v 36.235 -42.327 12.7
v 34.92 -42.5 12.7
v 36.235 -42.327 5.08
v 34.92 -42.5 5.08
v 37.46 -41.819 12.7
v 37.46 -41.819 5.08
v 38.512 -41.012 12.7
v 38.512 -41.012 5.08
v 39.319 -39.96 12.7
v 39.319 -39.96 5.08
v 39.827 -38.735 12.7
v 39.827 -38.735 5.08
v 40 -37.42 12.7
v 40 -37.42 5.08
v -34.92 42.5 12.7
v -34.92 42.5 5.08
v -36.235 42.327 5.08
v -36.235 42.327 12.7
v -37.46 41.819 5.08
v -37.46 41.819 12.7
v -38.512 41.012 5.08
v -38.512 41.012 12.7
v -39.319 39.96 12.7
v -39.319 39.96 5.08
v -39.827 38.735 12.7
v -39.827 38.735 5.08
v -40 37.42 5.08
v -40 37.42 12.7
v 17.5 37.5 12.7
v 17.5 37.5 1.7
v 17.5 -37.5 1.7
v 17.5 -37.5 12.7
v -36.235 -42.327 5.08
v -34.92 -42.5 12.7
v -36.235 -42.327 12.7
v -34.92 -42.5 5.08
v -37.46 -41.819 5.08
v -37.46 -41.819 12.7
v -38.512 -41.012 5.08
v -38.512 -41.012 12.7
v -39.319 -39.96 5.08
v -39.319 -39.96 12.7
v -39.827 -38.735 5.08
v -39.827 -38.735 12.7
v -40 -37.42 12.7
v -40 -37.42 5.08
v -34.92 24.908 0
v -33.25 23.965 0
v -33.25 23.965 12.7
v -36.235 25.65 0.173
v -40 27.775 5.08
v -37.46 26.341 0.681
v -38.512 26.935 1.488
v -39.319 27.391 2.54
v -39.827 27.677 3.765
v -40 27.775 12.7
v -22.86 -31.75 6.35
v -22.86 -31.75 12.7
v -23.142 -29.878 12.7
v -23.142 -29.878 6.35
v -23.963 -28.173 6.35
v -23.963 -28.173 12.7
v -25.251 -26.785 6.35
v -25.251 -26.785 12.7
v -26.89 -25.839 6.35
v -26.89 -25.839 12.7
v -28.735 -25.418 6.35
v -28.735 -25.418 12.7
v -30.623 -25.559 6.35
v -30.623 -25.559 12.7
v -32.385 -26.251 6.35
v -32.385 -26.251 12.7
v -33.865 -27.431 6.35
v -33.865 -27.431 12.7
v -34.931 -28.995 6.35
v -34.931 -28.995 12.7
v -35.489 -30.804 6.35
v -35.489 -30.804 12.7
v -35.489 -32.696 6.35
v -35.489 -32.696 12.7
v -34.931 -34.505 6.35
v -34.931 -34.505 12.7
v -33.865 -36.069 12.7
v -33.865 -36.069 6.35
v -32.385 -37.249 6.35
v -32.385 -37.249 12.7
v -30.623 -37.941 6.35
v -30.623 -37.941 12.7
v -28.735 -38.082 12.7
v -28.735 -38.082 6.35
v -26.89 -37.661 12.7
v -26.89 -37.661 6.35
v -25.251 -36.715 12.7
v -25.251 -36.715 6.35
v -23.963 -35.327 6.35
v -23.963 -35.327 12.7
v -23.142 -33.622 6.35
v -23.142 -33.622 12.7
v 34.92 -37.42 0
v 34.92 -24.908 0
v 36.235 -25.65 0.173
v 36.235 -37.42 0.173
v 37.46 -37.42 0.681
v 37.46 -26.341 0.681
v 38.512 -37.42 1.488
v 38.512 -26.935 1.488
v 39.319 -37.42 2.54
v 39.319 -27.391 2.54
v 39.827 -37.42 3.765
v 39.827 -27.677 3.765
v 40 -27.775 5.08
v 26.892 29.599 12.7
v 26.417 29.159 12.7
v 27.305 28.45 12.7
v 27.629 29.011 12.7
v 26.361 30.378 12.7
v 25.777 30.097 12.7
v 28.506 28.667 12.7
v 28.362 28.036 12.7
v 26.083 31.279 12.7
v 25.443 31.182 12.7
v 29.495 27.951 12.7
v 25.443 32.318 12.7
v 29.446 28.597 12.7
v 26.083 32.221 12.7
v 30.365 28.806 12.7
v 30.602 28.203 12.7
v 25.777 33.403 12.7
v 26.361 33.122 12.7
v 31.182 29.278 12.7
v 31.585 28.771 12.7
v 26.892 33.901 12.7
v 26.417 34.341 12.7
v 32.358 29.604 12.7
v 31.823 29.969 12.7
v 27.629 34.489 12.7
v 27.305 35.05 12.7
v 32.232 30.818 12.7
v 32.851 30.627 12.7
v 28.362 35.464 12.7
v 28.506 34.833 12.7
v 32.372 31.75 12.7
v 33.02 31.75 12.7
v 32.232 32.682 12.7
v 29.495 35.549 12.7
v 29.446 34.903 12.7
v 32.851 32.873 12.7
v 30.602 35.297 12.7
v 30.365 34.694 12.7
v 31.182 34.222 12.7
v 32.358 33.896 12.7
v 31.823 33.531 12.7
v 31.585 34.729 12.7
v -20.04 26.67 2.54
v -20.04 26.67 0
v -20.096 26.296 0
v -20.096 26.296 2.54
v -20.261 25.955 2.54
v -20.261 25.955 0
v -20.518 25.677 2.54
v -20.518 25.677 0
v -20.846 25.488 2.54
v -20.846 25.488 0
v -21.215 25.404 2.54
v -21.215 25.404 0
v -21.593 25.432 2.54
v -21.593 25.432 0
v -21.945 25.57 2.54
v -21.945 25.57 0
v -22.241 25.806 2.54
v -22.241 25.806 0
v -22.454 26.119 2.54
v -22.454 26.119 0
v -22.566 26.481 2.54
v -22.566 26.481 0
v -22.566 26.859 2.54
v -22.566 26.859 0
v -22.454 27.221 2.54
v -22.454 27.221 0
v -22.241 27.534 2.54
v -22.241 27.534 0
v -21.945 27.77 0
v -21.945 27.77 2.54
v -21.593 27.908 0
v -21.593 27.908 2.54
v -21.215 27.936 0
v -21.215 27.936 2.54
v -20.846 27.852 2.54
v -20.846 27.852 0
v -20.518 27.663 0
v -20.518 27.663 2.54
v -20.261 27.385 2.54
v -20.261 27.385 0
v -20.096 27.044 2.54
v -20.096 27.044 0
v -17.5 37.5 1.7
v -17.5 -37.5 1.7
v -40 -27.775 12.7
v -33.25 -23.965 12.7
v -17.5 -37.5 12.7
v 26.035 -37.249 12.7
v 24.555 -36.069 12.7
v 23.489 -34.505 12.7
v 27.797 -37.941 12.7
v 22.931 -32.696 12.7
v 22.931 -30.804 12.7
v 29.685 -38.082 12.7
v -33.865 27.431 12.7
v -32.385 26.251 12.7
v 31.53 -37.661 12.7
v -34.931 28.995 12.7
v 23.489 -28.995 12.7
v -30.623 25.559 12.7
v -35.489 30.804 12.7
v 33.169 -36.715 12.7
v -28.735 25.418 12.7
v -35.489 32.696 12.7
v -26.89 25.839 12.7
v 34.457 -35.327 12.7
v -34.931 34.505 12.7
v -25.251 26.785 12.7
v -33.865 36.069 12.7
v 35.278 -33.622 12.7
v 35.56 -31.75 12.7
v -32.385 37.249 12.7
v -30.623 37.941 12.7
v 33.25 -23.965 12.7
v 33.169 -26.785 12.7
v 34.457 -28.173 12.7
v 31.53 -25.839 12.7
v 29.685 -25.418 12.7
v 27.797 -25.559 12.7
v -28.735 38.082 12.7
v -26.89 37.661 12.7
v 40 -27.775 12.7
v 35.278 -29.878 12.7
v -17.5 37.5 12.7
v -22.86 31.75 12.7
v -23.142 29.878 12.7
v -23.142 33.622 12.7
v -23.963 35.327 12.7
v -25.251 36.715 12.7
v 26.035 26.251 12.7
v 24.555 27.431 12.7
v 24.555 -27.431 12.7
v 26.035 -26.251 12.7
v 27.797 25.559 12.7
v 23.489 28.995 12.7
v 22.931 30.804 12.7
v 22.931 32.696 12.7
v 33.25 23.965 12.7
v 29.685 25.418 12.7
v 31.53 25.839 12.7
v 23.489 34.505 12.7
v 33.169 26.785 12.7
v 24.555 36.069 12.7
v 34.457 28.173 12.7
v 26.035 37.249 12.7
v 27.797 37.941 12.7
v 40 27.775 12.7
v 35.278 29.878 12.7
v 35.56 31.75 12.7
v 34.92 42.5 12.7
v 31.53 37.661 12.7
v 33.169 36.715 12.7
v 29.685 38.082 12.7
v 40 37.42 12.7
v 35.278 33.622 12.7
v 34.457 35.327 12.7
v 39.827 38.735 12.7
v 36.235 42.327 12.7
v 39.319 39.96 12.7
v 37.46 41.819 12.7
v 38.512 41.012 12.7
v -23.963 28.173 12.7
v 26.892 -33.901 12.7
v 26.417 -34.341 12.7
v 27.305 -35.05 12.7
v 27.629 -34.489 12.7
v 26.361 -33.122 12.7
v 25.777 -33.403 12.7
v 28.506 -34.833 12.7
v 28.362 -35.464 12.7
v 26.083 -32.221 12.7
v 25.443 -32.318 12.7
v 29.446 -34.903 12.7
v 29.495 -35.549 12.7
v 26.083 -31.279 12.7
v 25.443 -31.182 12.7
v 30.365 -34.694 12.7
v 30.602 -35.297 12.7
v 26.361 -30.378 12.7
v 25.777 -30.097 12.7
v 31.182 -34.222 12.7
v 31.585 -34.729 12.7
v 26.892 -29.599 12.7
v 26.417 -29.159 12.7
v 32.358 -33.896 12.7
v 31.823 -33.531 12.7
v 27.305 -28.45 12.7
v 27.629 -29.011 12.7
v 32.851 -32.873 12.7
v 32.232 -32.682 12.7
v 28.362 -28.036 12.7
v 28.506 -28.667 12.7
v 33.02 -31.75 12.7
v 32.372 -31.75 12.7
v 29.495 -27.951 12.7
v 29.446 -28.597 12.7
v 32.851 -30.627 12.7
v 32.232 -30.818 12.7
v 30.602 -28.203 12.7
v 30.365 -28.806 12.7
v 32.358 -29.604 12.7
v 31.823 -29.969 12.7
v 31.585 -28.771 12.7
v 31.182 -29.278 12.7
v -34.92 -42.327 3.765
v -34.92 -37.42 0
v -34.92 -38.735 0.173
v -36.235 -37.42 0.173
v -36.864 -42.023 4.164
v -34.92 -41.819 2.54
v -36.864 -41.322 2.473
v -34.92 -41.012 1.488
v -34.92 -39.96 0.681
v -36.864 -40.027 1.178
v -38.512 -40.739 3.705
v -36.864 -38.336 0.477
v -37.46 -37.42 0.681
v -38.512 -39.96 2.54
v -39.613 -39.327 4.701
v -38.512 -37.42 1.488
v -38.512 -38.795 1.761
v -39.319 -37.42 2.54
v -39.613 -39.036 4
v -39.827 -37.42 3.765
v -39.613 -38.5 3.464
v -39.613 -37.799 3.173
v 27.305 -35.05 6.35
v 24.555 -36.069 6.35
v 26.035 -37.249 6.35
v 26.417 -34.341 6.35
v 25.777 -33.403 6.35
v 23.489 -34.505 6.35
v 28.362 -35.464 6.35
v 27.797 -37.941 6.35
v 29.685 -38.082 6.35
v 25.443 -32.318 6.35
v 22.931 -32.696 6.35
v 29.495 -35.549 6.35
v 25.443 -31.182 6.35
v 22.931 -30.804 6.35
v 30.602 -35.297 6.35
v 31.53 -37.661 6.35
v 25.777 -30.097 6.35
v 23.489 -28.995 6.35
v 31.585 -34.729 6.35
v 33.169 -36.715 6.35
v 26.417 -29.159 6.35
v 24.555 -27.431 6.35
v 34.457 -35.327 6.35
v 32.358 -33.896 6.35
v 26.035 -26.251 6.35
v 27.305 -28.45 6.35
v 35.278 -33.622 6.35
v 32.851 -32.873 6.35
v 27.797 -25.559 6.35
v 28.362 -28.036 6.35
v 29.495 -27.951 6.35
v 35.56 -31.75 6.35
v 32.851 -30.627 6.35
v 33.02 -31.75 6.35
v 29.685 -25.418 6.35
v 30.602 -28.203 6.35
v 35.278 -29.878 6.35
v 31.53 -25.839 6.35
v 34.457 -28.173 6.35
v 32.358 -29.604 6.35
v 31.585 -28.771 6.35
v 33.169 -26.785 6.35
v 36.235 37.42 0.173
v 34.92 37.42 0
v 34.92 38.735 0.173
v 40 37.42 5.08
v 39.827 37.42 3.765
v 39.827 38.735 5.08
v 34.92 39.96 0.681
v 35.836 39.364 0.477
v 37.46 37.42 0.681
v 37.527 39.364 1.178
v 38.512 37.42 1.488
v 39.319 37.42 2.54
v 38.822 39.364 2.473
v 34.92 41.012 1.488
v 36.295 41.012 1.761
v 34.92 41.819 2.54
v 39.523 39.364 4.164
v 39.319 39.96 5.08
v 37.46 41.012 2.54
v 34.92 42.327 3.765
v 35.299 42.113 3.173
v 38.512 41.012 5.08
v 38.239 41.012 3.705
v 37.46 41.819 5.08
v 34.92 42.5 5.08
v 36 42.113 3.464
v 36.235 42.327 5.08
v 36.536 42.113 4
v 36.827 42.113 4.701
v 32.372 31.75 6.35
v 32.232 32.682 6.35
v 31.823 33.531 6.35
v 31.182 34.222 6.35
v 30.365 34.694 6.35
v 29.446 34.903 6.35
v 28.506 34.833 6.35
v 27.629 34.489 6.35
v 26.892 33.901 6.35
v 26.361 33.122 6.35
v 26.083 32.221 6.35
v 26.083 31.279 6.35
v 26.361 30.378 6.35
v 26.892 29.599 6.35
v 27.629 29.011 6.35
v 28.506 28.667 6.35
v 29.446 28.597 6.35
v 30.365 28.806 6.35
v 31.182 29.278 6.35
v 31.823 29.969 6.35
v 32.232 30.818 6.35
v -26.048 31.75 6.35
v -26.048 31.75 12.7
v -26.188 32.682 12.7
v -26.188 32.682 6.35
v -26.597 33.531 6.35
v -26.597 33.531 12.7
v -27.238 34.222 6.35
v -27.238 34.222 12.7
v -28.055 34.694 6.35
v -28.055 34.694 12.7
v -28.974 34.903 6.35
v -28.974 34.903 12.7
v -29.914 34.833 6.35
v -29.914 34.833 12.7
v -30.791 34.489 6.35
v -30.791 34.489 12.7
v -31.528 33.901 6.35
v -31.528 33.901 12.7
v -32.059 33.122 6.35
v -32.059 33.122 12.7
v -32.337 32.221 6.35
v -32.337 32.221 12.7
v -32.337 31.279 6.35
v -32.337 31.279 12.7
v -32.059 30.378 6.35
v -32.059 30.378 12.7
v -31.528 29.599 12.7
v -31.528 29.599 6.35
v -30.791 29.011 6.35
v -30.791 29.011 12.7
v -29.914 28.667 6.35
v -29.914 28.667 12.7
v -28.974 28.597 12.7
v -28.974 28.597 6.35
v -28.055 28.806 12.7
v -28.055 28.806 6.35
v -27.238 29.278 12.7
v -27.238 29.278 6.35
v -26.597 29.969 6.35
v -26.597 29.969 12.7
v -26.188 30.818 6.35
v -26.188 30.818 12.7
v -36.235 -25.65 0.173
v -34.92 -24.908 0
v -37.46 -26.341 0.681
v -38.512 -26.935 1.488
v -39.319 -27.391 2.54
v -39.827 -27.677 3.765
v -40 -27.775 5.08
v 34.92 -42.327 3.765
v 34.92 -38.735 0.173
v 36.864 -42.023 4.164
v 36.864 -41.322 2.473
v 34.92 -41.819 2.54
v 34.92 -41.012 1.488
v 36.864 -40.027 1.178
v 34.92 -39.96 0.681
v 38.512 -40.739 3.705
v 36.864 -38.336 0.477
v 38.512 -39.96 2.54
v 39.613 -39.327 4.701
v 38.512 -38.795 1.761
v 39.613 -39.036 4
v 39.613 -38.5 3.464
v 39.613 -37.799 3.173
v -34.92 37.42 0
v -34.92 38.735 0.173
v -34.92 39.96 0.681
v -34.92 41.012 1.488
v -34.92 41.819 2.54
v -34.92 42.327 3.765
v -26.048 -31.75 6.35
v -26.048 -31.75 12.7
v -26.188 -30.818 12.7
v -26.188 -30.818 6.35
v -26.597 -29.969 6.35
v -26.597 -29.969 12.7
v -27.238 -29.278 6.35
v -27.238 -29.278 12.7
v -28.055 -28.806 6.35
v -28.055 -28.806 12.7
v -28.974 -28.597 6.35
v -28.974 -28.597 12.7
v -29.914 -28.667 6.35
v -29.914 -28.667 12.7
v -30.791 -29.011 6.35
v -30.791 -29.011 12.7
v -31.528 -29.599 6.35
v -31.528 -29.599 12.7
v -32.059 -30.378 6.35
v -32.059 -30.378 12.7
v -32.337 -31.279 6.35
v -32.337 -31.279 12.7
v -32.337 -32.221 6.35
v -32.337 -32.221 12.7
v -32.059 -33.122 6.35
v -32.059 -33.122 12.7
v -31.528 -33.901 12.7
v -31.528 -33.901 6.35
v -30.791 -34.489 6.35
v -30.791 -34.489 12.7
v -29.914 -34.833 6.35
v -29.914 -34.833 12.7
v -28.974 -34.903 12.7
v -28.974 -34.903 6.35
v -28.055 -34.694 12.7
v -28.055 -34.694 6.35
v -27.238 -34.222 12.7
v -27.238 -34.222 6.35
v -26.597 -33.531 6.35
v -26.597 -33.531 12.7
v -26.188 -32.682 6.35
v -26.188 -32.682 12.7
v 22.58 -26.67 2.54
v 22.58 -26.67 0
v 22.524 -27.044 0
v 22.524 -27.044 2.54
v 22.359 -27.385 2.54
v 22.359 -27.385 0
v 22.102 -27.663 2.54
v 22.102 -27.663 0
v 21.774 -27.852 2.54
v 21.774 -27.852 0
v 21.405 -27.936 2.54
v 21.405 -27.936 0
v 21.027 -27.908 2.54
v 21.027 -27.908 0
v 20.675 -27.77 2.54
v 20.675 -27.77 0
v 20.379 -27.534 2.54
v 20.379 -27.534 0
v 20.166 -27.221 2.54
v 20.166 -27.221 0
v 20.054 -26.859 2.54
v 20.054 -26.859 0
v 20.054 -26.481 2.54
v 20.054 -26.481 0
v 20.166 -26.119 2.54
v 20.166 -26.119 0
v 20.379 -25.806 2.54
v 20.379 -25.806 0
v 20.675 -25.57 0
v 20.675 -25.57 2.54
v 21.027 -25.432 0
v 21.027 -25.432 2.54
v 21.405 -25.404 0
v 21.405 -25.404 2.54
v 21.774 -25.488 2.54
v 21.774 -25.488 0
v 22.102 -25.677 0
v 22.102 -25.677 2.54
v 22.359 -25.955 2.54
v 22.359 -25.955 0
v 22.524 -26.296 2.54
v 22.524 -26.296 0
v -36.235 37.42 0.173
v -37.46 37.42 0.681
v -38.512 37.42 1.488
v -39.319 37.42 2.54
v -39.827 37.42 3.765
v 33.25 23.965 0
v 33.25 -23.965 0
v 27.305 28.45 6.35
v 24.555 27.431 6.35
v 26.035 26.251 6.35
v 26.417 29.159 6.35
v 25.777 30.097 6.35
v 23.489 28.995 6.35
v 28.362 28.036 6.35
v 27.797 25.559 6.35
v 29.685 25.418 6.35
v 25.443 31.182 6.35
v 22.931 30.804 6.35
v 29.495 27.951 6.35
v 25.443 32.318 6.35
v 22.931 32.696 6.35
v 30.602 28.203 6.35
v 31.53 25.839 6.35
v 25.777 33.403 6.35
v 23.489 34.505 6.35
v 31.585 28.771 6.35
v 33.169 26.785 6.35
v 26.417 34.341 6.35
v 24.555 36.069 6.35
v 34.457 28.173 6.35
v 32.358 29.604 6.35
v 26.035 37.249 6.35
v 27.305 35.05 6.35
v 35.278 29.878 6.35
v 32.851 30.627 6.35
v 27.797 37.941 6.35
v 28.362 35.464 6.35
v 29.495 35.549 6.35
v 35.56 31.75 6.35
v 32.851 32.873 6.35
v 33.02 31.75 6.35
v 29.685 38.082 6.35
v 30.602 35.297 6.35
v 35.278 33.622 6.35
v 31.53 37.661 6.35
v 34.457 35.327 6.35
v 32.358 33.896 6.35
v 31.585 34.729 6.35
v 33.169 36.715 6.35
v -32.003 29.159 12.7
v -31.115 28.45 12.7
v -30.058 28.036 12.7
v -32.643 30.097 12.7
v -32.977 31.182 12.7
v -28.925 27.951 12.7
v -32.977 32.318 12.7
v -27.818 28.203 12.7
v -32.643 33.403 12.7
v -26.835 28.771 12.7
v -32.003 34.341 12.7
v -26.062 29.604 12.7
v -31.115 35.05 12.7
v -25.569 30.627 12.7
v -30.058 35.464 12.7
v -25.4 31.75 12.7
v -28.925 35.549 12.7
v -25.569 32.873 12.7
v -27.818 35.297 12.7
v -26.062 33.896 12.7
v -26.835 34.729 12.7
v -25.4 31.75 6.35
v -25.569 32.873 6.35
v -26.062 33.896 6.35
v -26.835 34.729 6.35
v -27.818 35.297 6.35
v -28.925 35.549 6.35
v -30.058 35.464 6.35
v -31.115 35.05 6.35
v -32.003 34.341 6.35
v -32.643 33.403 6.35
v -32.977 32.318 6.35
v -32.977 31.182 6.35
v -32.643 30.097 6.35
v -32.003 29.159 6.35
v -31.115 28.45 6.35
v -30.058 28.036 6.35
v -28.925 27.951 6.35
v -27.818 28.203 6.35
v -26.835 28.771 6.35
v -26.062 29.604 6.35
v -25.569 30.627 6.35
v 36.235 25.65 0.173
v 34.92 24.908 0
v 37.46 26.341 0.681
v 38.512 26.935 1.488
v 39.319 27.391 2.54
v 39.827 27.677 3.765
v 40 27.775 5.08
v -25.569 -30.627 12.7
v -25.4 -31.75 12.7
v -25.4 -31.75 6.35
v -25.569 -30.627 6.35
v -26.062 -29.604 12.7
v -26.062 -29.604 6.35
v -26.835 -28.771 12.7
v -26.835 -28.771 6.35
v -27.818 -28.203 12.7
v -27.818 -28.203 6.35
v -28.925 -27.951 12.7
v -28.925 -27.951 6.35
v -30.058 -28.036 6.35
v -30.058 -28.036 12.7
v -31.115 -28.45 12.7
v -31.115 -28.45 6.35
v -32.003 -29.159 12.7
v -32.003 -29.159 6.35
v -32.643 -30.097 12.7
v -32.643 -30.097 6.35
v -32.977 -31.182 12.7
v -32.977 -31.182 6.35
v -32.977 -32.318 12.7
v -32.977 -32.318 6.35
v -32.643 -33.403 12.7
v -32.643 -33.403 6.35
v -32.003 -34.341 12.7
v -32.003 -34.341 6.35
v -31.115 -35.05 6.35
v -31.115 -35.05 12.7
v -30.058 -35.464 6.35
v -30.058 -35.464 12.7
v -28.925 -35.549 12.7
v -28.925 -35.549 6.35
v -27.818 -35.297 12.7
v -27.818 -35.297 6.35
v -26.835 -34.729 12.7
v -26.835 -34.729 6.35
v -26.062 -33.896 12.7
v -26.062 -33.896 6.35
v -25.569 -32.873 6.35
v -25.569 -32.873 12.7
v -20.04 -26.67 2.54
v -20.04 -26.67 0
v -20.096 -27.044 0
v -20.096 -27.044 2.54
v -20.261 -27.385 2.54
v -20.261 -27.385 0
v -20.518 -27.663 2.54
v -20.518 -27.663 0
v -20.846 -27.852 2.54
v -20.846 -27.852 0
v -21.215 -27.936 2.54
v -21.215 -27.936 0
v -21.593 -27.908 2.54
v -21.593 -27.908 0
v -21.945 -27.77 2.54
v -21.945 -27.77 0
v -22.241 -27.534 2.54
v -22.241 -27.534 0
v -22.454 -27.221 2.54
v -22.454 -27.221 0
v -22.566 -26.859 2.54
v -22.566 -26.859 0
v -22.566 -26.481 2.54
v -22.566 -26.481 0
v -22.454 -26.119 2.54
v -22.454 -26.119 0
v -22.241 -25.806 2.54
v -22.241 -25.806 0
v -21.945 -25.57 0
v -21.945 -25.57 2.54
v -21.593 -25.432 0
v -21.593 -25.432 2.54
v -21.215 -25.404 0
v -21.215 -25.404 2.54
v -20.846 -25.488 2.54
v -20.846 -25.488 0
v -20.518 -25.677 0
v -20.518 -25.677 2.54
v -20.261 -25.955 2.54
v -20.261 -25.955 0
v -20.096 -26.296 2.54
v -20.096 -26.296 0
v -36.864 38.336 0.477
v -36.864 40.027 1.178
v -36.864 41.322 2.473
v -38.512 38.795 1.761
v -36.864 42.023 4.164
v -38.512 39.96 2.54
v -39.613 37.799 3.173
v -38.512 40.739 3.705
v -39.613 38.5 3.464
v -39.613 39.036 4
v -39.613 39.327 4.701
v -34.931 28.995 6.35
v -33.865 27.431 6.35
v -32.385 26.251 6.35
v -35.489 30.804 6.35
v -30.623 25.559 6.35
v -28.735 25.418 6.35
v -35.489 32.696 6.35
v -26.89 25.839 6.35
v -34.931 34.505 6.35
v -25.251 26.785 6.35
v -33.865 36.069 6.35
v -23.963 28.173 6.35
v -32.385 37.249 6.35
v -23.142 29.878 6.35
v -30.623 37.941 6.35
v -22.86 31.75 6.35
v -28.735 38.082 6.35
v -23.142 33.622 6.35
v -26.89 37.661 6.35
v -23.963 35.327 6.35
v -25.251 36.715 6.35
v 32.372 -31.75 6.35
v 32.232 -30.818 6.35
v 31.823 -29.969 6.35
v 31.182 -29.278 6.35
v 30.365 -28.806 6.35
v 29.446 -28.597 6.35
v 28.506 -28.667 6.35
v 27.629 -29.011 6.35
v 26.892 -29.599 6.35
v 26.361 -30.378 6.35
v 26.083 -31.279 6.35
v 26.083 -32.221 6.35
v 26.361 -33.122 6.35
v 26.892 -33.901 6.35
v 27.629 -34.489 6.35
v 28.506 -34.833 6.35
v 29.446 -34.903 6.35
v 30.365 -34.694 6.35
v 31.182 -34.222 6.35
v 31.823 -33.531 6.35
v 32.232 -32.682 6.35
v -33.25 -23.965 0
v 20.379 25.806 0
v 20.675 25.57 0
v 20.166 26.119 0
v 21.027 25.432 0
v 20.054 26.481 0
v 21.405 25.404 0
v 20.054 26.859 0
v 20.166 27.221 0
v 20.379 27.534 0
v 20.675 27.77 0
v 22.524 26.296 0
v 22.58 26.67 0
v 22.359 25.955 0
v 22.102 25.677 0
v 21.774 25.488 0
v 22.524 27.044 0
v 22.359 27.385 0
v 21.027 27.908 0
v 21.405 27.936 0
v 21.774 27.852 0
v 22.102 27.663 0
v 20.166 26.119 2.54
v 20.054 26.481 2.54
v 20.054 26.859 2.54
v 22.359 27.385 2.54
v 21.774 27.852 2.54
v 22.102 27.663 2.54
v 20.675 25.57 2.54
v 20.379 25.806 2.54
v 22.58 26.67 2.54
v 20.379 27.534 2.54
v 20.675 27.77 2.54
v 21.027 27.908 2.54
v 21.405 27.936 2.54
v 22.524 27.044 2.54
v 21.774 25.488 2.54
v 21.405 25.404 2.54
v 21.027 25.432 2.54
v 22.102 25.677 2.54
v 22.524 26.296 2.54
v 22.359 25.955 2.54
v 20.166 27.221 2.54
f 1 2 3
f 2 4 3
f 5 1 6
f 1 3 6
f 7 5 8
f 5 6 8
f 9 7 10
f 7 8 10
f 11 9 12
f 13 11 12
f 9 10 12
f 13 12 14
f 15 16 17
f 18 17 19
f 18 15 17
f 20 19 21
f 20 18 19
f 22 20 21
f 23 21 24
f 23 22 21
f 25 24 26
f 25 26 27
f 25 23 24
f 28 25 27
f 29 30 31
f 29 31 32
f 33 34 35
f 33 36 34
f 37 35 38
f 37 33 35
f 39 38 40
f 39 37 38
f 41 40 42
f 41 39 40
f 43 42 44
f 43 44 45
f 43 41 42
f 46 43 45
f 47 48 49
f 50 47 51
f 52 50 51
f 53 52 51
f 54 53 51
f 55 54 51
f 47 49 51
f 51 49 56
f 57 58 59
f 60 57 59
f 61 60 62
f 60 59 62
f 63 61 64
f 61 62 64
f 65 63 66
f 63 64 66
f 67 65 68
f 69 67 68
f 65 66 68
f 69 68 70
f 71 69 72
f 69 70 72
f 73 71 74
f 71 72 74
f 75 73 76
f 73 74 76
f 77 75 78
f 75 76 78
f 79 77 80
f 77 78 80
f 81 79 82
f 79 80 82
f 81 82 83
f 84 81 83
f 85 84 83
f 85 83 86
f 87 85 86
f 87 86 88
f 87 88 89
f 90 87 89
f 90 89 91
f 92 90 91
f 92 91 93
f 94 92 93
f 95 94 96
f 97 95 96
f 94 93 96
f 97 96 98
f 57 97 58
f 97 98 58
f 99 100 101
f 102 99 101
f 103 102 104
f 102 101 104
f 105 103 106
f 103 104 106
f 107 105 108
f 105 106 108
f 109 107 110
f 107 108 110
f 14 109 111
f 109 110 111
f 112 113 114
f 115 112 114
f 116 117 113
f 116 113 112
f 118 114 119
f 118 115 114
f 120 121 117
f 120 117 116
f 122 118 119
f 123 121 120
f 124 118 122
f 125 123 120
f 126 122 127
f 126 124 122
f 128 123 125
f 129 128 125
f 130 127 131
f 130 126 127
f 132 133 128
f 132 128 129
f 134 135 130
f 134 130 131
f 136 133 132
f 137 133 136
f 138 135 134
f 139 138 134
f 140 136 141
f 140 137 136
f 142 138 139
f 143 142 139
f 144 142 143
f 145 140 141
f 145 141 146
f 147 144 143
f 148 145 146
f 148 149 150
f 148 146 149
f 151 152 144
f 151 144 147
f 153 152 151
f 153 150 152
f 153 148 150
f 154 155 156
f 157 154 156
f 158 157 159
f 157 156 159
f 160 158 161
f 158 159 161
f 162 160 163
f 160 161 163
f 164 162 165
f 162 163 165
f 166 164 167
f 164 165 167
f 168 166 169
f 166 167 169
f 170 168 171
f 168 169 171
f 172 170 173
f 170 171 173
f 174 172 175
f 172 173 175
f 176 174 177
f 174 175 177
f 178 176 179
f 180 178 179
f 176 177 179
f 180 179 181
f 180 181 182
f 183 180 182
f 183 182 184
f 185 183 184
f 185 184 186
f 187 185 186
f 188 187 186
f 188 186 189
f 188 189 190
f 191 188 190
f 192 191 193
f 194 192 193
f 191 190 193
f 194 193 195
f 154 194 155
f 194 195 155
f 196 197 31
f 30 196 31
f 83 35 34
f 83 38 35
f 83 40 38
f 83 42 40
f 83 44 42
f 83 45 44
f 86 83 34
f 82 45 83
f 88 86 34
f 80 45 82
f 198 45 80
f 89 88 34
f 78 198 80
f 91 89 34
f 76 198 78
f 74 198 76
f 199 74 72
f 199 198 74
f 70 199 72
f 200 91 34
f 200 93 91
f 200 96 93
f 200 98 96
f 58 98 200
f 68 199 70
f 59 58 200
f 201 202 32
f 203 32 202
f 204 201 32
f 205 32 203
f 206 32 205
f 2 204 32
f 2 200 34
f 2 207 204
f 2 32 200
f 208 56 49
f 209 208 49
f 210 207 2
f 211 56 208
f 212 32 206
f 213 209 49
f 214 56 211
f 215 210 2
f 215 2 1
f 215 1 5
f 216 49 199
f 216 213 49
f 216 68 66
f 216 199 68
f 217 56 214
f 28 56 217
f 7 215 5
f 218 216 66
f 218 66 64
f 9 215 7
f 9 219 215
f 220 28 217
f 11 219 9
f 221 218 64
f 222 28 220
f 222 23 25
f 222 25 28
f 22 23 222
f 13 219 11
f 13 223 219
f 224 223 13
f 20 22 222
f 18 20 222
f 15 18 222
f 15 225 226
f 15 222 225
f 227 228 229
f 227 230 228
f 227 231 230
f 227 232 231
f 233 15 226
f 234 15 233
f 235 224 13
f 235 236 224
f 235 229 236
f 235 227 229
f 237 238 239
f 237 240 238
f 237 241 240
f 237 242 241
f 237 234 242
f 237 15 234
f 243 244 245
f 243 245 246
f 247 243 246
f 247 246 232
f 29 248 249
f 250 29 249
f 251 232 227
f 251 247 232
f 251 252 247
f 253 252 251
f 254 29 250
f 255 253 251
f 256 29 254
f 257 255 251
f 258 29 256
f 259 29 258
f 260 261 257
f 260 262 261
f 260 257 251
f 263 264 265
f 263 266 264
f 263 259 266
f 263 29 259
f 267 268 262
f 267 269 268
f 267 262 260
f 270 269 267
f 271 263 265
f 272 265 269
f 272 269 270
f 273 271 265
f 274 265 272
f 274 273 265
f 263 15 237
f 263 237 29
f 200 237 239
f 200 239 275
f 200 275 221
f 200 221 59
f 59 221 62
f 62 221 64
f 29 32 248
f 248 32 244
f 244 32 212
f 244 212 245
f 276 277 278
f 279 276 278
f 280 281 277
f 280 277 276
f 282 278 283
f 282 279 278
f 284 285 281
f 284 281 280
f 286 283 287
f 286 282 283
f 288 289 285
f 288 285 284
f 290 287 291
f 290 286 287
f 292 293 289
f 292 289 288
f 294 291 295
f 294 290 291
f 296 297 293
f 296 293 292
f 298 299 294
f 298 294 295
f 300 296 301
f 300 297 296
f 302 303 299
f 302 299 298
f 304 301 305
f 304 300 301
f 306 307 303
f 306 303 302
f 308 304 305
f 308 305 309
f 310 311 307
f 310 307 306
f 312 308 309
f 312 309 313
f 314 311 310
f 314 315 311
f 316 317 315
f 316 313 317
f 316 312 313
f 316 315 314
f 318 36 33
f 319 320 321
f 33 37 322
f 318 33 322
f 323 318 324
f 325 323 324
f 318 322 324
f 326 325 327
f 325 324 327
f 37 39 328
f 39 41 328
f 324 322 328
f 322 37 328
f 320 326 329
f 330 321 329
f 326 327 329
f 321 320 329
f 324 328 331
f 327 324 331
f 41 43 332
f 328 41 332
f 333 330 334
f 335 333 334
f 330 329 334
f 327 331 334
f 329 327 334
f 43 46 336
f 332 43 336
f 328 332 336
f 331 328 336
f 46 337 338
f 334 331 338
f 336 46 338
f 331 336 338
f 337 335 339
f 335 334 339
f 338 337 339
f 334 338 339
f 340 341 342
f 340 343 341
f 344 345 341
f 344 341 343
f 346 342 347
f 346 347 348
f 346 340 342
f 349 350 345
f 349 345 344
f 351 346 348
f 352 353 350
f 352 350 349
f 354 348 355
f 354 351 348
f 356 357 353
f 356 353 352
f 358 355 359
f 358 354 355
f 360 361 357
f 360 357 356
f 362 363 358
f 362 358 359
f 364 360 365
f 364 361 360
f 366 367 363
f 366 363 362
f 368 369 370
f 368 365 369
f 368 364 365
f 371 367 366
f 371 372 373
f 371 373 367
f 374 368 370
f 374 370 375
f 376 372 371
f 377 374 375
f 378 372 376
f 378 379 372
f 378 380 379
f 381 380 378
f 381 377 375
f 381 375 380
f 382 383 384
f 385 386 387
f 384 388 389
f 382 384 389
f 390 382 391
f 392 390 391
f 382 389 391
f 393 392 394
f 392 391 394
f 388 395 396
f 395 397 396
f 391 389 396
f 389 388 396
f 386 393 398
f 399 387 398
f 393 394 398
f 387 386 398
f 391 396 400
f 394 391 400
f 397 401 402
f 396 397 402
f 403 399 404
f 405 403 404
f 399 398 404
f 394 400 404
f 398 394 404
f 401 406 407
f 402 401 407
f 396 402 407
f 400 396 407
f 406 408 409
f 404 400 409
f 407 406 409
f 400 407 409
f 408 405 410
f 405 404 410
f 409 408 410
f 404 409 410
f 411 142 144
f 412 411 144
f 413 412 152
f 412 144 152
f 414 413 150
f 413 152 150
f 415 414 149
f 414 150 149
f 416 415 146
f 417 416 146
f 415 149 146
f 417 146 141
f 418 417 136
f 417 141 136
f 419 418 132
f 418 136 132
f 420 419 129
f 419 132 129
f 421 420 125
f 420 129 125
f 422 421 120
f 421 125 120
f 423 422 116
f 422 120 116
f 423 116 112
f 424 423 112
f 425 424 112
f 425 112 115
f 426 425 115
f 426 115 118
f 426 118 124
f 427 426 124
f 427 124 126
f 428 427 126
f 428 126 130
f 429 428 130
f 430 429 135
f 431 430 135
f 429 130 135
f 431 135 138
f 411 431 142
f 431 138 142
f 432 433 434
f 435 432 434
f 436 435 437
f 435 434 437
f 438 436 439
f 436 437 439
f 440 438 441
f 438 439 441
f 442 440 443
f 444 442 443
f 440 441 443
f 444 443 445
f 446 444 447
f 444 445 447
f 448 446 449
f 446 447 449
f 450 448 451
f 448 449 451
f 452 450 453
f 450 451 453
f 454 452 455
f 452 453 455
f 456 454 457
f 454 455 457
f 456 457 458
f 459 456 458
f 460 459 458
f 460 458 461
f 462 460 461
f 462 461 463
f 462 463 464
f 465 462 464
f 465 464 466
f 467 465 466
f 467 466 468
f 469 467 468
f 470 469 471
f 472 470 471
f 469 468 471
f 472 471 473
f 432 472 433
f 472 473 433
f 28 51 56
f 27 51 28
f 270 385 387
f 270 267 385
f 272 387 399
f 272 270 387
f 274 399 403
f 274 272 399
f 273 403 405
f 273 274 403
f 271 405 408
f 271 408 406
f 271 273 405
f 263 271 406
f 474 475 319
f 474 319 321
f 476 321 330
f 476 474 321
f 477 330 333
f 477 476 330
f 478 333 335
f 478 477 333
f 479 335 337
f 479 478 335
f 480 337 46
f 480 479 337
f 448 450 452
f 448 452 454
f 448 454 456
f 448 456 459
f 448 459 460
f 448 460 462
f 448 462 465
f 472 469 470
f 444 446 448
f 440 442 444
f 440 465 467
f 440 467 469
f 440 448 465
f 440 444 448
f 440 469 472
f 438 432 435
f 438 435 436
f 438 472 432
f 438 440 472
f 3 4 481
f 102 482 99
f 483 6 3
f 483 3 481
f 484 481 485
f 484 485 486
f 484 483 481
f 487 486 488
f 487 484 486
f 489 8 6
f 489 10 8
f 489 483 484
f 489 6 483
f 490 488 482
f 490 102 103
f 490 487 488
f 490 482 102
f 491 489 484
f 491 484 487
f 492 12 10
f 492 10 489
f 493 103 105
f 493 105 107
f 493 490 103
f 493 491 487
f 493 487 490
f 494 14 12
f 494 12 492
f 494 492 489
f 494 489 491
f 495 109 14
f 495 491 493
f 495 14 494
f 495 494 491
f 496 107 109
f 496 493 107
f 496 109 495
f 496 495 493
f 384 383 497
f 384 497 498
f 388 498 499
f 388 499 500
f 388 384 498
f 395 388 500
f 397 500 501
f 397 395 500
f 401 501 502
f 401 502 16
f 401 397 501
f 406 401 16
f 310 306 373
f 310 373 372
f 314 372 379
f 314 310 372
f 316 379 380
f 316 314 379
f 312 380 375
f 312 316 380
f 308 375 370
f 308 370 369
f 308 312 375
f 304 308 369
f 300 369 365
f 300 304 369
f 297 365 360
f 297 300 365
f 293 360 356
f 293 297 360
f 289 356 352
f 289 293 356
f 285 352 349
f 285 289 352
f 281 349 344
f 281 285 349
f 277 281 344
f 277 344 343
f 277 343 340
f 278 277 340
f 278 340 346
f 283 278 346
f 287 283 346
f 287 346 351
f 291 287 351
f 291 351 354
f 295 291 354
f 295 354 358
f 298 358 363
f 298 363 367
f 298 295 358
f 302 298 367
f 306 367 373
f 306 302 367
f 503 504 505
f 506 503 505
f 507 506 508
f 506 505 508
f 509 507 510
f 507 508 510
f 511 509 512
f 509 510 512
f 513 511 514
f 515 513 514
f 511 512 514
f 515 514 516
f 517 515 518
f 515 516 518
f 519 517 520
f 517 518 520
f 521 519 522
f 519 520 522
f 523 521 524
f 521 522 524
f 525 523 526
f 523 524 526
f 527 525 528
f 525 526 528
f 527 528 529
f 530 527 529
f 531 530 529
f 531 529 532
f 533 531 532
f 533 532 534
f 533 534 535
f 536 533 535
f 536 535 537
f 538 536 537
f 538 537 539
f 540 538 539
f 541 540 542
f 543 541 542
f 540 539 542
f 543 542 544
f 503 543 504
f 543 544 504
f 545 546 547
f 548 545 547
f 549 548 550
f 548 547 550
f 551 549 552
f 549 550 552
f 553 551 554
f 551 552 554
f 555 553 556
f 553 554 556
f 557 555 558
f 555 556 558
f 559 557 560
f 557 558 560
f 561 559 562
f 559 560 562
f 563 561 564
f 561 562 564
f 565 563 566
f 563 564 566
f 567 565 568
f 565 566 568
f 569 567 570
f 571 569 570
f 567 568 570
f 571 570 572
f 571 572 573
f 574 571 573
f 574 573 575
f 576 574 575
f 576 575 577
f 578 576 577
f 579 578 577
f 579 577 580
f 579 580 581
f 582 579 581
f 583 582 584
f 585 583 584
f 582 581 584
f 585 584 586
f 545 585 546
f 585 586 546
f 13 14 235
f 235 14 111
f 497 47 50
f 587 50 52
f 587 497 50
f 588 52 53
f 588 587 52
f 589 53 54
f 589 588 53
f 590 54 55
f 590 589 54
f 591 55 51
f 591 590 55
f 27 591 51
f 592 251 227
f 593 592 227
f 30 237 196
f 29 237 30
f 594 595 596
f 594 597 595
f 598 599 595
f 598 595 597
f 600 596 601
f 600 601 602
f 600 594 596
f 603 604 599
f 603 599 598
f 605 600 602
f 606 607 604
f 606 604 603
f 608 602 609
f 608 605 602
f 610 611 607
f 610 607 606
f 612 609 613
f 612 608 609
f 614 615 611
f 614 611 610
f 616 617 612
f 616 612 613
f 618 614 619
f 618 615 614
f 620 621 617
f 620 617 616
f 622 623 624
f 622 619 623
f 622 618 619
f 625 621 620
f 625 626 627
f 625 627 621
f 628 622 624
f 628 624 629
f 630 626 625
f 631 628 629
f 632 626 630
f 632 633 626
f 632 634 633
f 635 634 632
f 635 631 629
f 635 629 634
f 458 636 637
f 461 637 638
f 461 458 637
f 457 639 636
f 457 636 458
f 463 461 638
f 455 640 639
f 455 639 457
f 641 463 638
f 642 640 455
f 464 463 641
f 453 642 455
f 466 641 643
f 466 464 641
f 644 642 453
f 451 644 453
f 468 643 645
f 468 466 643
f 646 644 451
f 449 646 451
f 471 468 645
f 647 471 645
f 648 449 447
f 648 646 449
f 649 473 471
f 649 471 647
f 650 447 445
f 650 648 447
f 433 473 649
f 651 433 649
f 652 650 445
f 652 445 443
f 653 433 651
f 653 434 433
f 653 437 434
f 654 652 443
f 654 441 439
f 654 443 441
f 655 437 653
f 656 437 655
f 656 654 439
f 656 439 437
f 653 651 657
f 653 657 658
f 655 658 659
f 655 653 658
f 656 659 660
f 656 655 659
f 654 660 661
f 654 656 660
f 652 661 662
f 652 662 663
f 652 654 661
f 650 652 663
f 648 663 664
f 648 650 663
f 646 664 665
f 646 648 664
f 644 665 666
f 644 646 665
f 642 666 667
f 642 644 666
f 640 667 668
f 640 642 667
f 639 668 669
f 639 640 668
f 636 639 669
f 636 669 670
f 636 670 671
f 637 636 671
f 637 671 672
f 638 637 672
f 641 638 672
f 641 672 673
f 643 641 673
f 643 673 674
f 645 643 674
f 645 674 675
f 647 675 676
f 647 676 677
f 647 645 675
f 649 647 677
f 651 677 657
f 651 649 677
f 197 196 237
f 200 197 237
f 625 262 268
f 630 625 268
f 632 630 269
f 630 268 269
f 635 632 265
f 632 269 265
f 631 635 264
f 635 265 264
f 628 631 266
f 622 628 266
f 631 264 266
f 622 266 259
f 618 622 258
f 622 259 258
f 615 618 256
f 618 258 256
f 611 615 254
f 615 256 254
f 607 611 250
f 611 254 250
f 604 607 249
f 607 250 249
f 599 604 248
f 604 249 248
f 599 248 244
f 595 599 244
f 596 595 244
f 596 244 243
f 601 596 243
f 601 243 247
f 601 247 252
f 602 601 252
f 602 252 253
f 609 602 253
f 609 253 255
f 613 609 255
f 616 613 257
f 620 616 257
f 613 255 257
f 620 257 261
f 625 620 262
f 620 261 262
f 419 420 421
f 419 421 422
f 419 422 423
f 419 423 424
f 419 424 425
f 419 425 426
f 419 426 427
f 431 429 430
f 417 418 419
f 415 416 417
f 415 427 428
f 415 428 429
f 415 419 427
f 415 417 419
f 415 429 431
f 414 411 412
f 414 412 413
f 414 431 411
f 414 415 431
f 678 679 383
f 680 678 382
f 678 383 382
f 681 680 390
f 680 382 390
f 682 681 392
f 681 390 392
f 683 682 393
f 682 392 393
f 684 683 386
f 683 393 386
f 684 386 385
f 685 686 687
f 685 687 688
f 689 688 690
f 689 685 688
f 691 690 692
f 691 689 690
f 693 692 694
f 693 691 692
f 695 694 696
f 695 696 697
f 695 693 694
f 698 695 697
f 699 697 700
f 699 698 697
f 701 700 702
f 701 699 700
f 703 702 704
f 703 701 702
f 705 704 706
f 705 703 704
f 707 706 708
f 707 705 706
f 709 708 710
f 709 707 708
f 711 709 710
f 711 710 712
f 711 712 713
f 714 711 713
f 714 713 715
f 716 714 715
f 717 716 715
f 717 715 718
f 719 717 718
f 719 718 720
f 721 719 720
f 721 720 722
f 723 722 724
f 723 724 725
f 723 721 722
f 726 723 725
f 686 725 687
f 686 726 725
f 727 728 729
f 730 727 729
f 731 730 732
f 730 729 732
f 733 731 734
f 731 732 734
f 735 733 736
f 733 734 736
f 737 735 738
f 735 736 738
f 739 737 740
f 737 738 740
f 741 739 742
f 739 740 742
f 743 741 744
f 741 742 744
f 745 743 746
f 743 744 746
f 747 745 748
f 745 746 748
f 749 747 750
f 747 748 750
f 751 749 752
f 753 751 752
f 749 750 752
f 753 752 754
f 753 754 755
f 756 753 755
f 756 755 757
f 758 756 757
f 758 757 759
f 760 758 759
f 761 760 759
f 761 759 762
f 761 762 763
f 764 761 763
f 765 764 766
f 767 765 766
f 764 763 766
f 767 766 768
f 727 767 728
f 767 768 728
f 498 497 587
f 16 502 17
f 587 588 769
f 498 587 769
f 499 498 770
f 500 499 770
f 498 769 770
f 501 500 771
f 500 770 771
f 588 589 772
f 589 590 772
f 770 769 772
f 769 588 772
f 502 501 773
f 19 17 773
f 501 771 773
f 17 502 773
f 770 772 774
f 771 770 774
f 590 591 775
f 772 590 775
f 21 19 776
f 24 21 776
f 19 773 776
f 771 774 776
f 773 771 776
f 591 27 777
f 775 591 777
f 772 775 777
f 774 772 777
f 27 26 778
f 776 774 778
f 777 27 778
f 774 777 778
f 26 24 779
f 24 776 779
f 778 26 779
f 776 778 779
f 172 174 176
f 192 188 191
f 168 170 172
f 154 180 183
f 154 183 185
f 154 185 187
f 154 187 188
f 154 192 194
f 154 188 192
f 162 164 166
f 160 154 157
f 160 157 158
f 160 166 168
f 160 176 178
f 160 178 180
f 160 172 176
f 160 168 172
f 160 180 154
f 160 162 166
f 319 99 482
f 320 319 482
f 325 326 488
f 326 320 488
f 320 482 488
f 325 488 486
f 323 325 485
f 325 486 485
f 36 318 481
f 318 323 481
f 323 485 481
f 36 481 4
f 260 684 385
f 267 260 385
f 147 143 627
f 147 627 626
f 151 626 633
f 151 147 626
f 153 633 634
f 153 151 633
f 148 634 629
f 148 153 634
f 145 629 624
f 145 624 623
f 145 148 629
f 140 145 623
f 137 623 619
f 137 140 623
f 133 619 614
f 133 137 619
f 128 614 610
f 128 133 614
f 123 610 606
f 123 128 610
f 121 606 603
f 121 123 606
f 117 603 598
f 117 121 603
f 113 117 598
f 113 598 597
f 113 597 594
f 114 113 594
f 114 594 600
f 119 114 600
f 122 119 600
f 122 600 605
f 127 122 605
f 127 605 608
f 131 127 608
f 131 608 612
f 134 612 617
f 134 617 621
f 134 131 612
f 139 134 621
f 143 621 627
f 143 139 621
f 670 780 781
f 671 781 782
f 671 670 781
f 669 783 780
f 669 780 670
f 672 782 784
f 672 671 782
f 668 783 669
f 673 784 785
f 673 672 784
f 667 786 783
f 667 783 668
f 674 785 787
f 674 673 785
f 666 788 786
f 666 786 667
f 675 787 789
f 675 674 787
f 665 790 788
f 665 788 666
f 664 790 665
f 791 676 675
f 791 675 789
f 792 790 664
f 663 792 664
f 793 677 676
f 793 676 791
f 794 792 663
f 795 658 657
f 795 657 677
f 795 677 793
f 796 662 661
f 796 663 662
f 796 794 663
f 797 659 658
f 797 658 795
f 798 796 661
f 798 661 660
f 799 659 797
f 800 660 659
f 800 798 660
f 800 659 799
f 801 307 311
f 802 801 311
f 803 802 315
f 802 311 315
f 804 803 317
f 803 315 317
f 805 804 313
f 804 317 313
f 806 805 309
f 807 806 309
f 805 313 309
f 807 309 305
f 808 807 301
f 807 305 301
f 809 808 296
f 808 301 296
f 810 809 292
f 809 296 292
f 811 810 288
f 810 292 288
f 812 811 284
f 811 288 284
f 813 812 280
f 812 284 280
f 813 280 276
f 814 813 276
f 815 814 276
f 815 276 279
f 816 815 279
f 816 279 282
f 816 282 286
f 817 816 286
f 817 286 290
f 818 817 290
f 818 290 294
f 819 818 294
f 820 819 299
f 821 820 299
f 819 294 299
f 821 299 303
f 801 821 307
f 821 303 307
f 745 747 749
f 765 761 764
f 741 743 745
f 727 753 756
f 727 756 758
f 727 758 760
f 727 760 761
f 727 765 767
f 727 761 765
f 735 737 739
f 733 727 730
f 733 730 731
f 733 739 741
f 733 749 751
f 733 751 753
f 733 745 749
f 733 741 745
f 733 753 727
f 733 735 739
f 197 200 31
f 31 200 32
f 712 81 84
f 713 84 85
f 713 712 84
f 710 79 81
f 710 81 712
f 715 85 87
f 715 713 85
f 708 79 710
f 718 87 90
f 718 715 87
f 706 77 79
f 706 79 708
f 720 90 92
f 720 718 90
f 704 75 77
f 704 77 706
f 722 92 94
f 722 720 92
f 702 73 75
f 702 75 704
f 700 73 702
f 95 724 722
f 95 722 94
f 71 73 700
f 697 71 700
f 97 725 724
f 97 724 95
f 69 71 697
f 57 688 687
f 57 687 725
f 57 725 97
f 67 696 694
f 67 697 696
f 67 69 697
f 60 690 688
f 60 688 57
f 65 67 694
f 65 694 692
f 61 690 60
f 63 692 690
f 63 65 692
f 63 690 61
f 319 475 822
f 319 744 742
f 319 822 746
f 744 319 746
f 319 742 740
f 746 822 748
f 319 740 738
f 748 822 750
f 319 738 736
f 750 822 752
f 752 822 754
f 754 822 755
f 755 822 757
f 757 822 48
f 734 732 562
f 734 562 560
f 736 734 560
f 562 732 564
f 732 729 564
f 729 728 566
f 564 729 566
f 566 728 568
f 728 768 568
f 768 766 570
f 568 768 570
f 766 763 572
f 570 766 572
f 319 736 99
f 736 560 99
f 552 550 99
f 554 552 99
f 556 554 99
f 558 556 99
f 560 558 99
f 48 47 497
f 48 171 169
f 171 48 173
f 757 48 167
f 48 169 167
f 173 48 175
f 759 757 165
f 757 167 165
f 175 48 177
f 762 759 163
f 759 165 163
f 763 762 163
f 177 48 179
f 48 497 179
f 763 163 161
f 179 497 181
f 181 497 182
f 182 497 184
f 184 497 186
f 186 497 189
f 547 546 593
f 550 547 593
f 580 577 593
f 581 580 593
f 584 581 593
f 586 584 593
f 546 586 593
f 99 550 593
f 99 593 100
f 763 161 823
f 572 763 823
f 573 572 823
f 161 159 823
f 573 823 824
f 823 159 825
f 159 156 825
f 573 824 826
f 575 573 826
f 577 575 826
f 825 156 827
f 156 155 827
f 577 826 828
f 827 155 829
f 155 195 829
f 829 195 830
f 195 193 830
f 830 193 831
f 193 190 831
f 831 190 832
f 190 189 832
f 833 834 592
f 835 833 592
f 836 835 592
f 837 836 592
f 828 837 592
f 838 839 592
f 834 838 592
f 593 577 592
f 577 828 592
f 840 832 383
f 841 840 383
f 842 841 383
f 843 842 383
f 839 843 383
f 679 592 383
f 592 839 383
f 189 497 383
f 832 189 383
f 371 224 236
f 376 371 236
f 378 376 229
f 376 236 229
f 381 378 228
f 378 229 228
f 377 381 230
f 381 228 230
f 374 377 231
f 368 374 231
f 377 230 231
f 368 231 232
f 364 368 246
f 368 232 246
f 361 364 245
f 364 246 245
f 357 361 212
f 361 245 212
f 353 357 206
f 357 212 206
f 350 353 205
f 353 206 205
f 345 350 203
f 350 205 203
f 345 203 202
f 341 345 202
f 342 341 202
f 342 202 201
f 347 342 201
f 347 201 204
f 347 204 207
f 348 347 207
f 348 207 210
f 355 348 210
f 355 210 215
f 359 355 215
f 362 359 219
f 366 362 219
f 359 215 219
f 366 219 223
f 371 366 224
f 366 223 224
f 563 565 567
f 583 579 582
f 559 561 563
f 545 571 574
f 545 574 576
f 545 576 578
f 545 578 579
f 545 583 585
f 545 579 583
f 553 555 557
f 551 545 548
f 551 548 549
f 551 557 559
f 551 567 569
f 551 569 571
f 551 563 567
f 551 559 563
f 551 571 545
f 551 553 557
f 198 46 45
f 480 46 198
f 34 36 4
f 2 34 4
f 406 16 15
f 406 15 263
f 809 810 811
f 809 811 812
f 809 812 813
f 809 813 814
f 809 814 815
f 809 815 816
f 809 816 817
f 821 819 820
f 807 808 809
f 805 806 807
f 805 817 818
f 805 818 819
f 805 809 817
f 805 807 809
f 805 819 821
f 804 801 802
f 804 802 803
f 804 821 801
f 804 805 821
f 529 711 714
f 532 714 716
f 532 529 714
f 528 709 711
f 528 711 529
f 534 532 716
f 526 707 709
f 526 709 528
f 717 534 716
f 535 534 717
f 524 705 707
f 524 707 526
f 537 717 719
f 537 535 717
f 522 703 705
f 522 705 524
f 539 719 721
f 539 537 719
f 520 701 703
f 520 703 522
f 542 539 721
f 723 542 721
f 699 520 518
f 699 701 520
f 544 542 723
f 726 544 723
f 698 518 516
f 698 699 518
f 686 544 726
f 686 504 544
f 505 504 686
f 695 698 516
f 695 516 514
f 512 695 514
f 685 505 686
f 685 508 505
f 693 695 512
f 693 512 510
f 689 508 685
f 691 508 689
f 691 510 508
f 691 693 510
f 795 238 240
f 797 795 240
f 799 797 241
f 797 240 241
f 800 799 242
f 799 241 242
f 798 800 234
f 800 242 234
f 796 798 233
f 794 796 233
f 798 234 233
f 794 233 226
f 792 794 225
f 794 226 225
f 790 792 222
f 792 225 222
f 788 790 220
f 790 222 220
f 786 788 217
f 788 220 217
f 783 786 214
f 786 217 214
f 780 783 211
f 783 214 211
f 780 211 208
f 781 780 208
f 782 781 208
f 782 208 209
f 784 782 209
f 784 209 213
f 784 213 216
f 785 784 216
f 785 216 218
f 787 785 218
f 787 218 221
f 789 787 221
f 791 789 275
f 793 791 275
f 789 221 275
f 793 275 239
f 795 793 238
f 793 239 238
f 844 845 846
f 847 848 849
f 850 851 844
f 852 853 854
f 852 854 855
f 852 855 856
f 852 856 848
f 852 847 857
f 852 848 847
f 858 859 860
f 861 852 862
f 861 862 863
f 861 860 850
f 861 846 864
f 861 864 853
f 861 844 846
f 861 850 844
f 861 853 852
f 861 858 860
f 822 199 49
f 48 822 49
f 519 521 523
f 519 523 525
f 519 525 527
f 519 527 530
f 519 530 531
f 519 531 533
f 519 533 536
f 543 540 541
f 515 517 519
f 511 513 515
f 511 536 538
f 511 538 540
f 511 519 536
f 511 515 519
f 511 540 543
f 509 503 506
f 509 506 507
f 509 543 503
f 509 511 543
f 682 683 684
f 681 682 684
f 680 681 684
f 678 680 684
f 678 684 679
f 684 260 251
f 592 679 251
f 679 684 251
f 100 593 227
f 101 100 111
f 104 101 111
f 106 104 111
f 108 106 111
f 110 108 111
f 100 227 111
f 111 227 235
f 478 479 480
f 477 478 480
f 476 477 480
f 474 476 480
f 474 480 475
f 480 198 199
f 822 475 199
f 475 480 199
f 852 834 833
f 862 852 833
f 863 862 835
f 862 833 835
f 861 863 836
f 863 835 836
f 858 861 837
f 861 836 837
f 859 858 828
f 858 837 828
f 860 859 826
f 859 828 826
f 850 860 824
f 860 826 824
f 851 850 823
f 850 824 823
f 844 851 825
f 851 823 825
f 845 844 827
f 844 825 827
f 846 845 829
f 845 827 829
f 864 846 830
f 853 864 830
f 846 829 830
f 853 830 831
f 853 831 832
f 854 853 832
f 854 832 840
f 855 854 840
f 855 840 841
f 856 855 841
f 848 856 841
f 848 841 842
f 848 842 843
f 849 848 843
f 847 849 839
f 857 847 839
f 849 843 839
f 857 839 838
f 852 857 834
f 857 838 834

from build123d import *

# Parameters (mm, degrees)
F0_W      = 80
F0_H      = 85
F1_DEPTH  = 25.4
F2_W      = 35
F2_H      = 22
F3_DEPTH  = 37.5
F4_W      = 80
F4_H      = 85
F5_DEPTH  = 12.7
F6_R      = 3.1623
F7_DEPTH  = 6.35
F8_R      = 5.08
F9_R      = 5.08
F10_R     = 5.08
F11_R     = 5.08
F12_R     = 1.27
F13_DEPTH = 2.54
F15_DEPTH = 25.4
F16_R     = 6.35
F16_R_2   = 3.81
F17_DEPTH = 6.35


with BuildPart() as f1:
    # F0 (on Top) → F1 (new body)
    with BuildSketch(Plane.XY):
        Rectangle(F0_W, F0_H)
    extrude(amount=F1_DEPTH)

    # F2 (on Front) → F3 (cut, symmetric)
    with BuildSketch(Plane.XZ):
        with Locations((0, 12.7)):
            Rectangle(F2_W, F2_H)
    extrude(amount=F3_DEPTH, both=True, mode=Mode.SUBTRACT)

    # F4 (on face) → F5 (cut)
    with BuildSketch(Plane.XY.offset(25.4)):
        Rectangle(F4_W, F4_H)
    extrude(amount=-F5_DEPTH, mode=Mode.SUBTRACT)

    # F6 (on face) → F7 (cut)
    with BuildSketch(Plane.XY.offset(12.7)):
        with Locations((-29.21, -31.75)):
            Circle(F6_R)
        with Locations((29.21, -31.75)):
            Circle(F6_R)
        with Locations((29.21, 31.75)):
            Circle(F6_R)
        with Locations((-29.21, 31.75)):
            Circle(F6_R)
    extrude(amount=-F7_DEPTH, mode=Mode.SUBTRACT)

    # F8
    f8_edges = [f1.edges().sort_by_distance(p)[0] for p in [
        (0, -42.5, 0),
    ]]
    fillet(f8_edges, radius=F8_R)

    # F9
    f9_edges = [f1.edges().sort_by_distance(p)[0] for p in [
        (40, 2.54, 0),
    ]]
    fillet(f9_edges, radius=F9_R)

    # F10
    f10_edges = [f1.edges().sort_by_distance(p)[0] for p in [
        (-2.54, 42.5, 0),
    ]]
    fillet(f10_edges, radius=F10_R)

    # F11
    f11_edges = [f1.edges().sort_by_distance(p)[0] for p in [
        (-40, 0, 0),
    ]]
    fillet(f11_edges, radius=F11_R)

    # F12 (on face) → F13 (cut)
    with BuildSketch(Plane(origin=(0, 0, 0), x_dir=(1, 0, 0), z_dir=(0, 0, -1))):
        with Locations((-21.31, 26.67)):
            Circle(F12_R)
        with Locations((-21.31, -26.67)):
            Circle(F12_R)
        with Locations((21.31, 26.67)):
            Circle(F12_R)
        with Locations((21.31, -26.67)):
            Circle(F12_R)
    extrude(amount=-F13_DEPTH, mode=Mode.SUBTRACT)

    # F14 (on face) → F15 (cut)
    with BuildSketch(Plane.XY.offset(12.7)):
        Polygon((-40, 27.7749088), (-40, -27.7749088), (-33.2500008, -23.9649088), (-33.2500008, 23.9649088), align=None)
        Polygon((33.2500008, -23.9649088), (40, -27.7749088), (40, 27.7749088), (33.2500008, 23.9649088), align=None)
    extrude(amount=-F15_DEPTH, mode=Mode.SUBTRACT)

    # F16 (on face) → F17 (cut)
    with BuildSketch(Plane.XY.offset(12.7)):
        with Locations((-29.21, -31.75)):
            Circle(F16_R)
        with Locations((-29.21, -31.75)):
            Circle(F16_R_2, mode=Mode.SUBTRACT)
        with Locations((29.21, -31.75)):
            Circle(F16_R)
        with Locations((29.21, -31.75)):
            Circle(F16_R_2, mode=Mode.SUBTRACT)
        with Locations((29.21, 31.75)):
            Circle(F16_R)
        with Locations((29.21, 31.75)):
            Circle(F16_R_2, mode=Mode.SUBTRACT)
        with Locations((-29.21, 31.75)):
            Circle(F16_R)
        with Locations((-29.21, 31.75)):
            Circle(F16_R_2, mode=Mode.SUBTRACT)
    extrude(amount=-F17_DEPTH, mode=Mode.SUBTRACT)


solid = f1.part
